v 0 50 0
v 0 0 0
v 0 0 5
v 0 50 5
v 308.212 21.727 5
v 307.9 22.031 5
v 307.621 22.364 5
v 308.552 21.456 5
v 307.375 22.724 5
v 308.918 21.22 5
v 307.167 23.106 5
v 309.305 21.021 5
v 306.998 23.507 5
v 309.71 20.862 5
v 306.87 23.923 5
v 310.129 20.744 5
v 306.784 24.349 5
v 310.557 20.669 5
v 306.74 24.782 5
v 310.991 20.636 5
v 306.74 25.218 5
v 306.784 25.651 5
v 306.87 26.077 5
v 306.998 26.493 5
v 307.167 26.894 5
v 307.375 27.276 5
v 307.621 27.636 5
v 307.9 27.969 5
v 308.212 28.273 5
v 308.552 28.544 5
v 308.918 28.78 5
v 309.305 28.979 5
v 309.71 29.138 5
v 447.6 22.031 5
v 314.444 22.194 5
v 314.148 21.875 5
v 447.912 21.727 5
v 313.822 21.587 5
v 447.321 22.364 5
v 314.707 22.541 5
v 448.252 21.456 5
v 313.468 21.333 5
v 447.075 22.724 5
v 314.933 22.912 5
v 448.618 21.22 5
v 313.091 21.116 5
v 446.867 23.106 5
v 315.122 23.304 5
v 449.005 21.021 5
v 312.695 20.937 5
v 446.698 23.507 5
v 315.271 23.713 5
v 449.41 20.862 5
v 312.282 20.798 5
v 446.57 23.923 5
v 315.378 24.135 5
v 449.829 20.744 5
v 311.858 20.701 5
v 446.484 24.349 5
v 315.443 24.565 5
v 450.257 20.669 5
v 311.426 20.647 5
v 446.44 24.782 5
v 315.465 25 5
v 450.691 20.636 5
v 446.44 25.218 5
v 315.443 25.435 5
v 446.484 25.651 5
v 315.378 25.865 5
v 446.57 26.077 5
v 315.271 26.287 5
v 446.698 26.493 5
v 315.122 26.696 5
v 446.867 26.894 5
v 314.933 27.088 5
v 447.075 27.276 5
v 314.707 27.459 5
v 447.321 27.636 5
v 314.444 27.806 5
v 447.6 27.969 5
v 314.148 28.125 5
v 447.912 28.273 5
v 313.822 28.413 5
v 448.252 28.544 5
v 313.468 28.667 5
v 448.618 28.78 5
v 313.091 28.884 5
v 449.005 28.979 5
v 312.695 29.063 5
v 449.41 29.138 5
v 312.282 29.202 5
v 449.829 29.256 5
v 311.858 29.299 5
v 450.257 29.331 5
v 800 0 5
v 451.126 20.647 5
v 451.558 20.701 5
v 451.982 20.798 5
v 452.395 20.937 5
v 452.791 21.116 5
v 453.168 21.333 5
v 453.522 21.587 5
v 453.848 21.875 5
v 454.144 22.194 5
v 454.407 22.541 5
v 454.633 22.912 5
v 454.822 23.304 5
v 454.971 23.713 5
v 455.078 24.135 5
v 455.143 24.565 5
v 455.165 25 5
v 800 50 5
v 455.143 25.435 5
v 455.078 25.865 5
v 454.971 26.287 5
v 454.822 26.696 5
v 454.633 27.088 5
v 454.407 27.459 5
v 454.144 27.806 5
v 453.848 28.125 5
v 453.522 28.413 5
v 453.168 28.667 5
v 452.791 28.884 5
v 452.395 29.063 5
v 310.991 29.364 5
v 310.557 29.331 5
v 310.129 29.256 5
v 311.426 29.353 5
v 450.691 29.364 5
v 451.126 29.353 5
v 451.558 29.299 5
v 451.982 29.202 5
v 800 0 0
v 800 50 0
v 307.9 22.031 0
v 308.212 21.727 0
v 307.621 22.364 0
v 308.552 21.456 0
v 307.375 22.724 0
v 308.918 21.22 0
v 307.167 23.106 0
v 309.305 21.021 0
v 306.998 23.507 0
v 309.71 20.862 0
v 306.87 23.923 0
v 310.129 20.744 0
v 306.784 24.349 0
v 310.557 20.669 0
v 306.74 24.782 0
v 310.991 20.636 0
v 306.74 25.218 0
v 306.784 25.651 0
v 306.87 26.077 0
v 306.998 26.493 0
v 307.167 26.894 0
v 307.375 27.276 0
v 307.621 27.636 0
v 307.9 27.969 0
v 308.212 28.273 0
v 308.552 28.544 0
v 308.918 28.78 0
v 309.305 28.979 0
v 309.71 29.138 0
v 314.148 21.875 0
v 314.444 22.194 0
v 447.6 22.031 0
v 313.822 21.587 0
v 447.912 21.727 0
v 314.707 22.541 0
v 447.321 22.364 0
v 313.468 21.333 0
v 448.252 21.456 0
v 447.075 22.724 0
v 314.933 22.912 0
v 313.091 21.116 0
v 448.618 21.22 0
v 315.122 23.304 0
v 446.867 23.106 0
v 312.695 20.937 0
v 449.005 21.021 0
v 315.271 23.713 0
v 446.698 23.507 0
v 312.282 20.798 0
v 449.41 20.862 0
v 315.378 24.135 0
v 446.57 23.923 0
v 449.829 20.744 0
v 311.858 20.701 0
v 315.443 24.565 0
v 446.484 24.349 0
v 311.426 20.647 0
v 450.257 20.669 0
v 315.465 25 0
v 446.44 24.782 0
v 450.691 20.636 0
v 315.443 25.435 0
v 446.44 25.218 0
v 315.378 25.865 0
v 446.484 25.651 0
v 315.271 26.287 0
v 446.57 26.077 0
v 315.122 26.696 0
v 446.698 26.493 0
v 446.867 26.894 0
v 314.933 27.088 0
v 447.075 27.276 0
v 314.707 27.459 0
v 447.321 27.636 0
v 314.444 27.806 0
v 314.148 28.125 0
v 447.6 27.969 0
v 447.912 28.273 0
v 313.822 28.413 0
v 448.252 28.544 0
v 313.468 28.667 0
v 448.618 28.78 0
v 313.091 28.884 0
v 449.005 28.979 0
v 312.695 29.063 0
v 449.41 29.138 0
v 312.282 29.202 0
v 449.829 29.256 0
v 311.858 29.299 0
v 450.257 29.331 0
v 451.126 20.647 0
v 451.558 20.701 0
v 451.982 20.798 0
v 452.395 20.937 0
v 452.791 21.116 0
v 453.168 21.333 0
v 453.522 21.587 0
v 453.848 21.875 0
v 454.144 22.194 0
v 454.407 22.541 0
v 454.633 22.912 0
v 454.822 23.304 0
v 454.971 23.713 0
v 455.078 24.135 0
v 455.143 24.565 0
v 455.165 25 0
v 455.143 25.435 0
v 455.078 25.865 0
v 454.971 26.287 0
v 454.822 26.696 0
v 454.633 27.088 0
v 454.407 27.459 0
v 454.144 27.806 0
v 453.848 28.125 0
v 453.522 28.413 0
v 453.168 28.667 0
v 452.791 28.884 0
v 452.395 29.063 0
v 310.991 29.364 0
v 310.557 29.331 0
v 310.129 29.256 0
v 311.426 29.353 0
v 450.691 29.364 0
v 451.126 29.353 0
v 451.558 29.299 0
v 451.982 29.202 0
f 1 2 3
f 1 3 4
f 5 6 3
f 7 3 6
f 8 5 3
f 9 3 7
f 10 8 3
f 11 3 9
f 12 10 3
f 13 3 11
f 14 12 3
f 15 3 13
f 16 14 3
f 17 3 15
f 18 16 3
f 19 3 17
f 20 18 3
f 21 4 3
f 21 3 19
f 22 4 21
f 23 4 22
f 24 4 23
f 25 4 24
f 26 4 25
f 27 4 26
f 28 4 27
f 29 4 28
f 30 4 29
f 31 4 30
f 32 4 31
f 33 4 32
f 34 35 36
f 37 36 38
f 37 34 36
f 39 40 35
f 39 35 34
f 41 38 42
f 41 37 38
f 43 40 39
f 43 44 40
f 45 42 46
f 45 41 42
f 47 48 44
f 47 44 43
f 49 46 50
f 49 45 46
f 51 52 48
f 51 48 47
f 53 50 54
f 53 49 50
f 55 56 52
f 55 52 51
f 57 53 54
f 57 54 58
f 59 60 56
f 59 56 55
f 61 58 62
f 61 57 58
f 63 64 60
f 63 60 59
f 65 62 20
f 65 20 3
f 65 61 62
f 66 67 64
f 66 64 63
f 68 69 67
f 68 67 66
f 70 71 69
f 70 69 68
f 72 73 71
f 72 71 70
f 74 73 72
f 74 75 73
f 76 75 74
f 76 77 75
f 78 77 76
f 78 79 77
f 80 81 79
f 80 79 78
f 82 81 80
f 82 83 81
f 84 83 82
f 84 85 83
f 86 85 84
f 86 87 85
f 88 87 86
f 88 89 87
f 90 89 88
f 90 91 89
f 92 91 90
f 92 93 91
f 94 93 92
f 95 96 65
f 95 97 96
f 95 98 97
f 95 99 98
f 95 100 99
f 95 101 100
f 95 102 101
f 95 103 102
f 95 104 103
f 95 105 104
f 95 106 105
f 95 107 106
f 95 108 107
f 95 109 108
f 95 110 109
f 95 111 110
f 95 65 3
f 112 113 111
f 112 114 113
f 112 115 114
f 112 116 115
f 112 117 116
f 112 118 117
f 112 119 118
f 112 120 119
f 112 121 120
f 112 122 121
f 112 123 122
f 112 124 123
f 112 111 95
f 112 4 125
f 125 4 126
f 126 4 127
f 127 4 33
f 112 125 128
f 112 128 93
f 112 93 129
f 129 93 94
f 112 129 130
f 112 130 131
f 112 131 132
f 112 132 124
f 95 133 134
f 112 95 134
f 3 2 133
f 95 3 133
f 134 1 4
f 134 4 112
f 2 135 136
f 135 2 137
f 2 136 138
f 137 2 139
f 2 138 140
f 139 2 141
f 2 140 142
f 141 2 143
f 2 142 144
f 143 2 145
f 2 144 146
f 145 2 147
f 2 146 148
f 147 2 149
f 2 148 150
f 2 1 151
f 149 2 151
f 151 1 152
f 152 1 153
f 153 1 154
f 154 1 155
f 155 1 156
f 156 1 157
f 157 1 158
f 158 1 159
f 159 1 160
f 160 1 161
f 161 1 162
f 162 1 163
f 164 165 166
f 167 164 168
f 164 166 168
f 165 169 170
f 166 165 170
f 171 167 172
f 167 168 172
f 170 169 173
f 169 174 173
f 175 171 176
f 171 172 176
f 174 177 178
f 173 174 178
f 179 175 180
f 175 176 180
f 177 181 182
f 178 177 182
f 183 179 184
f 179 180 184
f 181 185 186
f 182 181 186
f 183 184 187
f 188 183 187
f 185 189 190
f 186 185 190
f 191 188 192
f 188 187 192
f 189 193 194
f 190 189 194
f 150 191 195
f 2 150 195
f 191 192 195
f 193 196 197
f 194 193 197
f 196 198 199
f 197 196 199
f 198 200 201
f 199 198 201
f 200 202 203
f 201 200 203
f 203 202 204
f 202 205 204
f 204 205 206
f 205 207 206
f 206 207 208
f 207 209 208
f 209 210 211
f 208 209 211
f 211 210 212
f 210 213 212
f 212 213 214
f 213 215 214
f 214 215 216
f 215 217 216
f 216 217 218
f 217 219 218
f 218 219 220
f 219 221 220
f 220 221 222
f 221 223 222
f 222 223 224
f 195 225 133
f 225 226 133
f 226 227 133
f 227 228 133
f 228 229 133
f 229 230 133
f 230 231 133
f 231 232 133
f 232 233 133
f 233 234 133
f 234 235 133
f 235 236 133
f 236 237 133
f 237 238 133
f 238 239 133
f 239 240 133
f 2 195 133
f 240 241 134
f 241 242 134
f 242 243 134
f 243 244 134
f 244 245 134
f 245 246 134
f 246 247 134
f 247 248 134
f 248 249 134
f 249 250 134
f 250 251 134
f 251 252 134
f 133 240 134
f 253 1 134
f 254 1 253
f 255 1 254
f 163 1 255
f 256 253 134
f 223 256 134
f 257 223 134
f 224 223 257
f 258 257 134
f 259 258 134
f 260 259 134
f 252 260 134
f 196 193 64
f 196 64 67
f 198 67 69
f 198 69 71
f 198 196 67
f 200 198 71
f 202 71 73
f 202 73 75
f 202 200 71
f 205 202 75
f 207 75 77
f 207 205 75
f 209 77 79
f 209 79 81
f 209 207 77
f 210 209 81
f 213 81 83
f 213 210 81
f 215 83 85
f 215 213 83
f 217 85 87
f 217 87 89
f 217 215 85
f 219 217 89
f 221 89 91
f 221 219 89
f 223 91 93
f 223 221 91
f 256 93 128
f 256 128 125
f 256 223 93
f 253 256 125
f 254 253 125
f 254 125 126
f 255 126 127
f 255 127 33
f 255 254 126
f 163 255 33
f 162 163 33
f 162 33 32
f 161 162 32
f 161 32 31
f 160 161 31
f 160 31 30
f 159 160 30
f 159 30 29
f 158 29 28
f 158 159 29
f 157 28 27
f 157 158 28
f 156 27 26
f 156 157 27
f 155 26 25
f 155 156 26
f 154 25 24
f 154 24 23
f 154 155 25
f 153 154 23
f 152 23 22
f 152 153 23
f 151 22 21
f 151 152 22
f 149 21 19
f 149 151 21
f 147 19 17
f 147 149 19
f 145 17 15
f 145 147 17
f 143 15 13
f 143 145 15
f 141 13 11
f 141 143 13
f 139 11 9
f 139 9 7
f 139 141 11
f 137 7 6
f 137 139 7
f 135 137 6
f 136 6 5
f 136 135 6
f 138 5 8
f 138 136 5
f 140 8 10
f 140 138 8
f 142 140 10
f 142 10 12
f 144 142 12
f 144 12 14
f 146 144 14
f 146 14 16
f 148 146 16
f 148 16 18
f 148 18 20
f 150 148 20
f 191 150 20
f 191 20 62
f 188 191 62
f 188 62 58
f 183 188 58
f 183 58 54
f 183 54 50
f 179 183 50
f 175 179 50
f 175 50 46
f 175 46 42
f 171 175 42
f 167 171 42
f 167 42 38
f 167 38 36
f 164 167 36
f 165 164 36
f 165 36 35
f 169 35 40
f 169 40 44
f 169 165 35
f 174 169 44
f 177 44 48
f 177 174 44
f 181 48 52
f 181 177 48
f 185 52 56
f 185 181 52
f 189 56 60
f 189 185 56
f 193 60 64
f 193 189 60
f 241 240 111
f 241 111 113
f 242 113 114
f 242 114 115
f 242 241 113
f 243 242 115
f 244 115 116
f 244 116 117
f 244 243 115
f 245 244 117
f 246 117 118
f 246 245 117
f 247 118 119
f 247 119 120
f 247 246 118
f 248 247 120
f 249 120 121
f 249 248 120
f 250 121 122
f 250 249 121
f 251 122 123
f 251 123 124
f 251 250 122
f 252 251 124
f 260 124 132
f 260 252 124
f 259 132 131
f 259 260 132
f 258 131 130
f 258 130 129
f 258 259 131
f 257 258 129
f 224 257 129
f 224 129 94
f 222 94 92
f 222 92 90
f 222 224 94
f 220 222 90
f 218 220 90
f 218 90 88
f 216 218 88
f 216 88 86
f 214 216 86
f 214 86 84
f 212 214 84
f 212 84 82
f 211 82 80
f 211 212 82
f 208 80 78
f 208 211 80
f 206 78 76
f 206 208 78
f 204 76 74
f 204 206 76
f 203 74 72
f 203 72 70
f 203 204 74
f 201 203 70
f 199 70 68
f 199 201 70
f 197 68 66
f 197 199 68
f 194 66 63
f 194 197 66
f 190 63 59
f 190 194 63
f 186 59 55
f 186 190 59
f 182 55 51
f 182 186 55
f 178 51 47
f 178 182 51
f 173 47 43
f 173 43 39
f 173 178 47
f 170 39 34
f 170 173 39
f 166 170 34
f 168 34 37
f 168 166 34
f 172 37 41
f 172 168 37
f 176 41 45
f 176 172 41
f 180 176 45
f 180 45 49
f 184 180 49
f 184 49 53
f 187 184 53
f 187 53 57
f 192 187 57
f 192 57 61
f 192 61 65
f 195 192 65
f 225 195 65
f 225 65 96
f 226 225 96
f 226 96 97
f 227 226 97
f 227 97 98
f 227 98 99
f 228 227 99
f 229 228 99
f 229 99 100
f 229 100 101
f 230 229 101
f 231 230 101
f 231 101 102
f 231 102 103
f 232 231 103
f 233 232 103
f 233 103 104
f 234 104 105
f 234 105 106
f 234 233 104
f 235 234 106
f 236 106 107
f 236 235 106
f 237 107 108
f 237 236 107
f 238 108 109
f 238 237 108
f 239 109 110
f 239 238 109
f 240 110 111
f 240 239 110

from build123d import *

# Parameters (mm, degrees)
SZKIC1_W                    = 400
SZKIC1_H                    = 50
SZKIC1_R                    = 4.365
DODANIE_WYCI_GNI_CIE1_DEPTH = 5


with BuildPart() as part:
    # Szkic1 → Dodanie-wyciągnięcie1 (new body)
    # profile 1 of 2: a face of its own
    with BuildSketch(Plane.XY):
        with Locations((200, 25)):
            Rectangle(SZKIC1_W, SZKIC1_H)
        with Locations((311.1, 25)):
            Circle(SZKIC1_R, mode=Mode.SUBTRACT)
    # profile 2 of 2: a face of its own
    with BuildSketch(Plane.XY):
        with Locations((600, 25)):
            Rectangle(SZKIC1_W, SZKIC1_H)
        with Locations((450.8, 25)):
            Circle(SZKIC1_R, mode=Mode.SUBTRACT)
    extrude(amount=DODANIE_WYCI_GNI_CIE1_DEPTH)


solid = part.part
